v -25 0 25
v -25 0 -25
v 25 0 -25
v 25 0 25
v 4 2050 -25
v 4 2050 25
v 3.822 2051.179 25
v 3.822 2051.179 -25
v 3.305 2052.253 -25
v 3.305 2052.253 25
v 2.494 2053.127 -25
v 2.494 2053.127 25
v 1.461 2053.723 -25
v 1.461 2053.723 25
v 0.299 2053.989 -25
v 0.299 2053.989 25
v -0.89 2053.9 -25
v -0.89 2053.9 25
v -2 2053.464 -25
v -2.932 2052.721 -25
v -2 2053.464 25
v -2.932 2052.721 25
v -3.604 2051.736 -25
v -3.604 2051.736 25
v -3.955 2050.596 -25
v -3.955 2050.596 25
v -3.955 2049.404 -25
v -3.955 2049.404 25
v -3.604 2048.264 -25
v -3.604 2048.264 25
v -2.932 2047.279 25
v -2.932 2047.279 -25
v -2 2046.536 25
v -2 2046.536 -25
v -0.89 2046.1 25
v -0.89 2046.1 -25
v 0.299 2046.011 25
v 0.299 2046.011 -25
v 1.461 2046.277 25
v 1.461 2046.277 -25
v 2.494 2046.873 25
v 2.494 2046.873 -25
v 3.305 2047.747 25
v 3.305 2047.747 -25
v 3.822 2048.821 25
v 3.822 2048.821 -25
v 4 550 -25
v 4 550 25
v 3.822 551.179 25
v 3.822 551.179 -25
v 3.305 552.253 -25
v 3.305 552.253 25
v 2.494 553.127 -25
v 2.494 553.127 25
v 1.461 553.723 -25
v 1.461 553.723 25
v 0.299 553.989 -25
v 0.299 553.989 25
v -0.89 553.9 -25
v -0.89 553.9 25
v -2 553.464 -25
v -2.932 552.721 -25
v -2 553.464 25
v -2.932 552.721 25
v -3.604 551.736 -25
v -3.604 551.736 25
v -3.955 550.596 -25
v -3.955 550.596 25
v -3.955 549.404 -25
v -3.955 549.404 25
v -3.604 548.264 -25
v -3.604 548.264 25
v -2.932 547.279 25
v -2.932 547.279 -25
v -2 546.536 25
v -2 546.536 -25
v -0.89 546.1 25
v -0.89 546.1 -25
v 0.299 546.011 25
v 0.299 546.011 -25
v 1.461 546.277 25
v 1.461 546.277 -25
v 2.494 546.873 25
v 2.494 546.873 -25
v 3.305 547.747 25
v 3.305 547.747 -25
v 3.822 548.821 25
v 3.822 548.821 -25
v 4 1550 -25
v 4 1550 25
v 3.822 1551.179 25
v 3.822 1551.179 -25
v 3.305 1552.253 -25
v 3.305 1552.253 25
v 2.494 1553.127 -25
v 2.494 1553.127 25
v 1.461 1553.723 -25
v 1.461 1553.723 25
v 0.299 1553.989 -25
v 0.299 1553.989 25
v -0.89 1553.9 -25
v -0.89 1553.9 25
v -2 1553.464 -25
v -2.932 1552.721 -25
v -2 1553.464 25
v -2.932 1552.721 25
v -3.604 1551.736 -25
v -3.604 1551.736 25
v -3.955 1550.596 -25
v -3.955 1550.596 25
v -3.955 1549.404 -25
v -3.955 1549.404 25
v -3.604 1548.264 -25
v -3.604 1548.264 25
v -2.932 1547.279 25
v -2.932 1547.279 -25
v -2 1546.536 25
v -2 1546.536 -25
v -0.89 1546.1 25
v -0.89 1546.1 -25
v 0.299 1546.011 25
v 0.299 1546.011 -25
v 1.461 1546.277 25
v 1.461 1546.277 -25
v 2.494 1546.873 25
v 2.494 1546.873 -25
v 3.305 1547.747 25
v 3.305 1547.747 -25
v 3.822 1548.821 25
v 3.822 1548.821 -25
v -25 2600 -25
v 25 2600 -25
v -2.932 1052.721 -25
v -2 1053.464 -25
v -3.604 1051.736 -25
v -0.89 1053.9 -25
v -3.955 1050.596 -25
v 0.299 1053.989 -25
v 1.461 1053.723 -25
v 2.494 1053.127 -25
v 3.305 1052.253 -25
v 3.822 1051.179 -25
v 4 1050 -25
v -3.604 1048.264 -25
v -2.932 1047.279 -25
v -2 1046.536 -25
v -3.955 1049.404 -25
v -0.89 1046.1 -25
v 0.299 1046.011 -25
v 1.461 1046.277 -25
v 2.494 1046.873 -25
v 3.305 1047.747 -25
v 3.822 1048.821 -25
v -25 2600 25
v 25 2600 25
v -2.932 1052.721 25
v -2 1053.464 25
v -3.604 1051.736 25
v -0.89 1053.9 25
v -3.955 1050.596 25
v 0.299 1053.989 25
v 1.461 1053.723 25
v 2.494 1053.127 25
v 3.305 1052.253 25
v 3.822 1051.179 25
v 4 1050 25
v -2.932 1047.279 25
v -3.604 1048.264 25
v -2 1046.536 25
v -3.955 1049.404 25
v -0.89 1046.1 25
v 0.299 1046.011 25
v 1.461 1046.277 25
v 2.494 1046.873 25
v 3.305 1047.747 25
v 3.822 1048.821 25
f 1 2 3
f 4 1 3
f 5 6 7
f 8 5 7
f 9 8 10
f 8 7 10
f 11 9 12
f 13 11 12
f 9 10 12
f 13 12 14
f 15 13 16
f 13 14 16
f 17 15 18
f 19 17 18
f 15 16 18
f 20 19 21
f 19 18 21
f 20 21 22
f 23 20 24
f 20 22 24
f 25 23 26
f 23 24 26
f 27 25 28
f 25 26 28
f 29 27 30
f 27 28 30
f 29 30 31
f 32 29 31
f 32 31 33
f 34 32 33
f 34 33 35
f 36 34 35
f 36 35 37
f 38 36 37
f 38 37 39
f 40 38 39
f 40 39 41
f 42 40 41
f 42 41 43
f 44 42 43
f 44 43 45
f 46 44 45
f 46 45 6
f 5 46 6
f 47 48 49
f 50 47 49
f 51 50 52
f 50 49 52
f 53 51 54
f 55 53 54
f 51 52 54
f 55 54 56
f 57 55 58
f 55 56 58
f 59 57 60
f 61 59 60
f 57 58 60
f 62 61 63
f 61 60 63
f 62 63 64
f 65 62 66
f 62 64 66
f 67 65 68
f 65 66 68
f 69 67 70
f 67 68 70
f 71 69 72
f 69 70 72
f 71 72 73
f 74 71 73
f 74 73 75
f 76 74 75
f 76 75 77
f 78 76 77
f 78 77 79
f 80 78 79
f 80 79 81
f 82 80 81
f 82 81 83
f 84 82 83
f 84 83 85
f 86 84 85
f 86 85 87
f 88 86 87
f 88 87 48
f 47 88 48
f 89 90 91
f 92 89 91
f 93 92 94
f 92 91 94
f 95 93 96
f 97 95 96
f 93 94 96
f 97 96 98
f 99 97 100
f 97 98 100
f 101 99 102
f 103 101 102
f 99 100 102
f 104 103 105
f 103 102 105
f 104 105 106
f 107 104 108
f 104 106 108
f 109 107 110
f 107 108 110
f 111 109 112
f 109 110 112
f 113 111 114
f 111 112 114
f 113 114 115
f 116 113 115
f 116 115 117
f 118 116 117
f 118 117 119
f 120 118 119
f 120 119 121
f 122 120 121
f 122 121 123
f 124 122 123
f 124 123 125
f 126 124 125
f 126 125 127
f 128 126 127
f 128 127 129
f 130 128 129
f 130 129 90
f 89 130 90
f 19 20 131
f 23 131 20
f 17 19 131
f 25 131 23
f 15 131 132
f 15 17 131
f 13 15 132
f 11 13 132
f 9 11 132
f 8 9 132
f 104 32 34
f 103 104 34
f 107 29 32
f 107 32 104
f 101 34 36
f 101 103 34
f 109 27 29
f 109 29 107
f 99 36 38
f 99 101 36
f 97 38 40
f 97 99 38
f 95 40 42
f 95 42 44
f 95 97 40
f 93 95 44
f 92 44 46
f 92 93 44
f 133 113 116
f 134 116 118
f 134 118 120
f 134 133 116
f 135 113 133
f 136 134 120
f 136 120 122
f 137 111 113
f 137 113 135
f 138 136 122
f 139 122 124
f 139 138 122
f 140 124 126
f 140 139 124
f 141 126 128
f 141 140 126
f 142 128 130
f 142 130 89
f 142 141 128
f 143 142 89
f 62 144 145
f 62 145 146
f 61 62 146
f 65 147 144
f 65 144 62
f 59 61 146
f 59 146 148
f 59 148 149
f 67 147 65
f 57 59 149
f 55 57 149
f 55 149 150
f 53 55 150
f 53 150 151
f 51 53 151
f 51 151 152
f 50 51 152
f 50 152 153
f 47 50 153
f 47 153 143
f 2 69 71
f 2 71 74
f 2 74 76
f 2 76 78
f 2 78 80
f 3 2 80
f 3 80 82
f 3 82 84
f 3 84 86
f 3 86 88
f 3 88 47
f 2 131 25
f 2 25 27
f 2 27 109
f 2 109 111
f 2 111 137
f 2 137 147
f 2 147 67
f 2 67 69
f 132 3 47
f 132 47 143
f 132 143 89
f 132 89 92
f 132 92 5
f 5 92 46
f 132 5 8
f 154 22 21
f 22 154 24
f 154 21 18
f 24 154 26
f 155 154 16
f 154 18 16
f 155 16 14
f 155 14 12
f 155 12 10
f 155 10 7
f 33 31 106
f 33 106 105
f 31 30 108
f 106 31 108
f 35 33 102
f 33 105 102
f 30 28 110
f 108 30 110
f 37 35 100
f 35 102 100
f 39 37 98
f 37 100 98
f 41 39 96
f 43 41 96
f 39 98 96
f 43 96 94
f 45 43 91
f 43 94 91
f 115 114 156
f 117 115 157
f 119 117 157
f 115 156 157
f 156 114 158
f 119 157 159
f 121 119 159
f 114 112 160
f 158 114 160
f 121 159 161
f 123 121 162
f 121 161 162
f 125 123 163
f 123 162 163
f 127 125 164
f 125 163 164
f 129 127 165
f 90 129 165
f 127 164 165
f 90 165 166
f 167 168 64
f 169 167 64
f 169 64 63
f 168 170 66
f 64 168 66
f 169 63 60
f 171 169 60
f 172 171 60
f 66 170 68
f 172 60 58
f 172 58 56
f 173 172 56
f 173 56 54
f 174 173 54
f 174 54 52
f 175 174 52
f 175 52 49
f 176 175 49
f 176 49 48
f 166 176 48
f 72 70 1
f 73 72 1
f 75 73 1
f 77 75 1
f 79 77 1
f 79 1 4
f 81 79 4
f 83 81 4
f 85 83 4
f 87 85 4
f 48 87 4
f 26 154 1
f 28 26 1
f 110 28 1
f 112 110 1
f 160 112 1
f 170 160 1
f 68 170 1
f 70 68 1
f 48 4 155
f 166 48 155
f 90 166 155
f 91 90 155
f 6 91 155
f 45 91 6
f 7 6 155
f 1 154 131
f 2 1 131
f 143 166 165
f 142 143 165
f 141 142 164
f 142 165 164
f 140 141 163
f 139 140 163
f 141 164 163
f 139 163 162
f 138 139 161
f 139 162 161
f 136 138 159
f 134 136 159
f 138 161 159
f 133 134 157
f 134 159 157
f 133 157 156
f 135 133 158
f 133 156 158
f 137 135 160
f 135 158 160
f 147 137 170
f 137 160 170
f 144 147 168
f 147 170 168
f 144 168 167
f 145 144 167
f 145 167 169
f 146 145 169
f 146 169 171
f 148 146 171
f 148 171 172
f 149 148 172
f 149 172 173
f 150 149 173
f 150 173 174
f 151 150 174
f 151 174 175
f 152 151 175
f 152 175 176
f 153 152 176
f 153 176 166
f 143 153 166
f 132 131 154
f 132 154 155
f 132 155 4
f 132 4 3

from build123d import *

# Parameters (mm, degrees)
SKETCH_1_W          = 50
SKETCH_1_H          = 50
EXTRUDE_1_DEPTH     = 2600
SKETCH_2_R          = 4
CUT_EXTRUDE_1_DEPTH = 100


with BuildPart() as part:
    # Эскиз1 → Бобышка-Вытянуть1 (new body)
    with BuildSketch(Plane(origin=(0, 0, 0), x_dir=(1, 0, 0), z_dir=(0, 1, 0))):
        Rectangle(SKETCH_1_W, SKETCH_1_H)
    extrude(amount=EXTRUDE_1_DEPTH)

    # Эскиз2 → Вырез-Вытянуть1 (cut)
    with BuildSketch(Plane.XY.offset(25)):
        with Locations((0, 2050)):
            Circle(SKETCH_2_R)
        with Locations((0, 1550)):
            Circle(SKETCH_2_R)
        with Locations((0, 1050)):
            Circle(SKETCH_2_R)
        with Locations((0, 550)):
            Circle(SKETCH_2_R)
    extrude(amount=-CUT_EXTRUDE_1_DEPTH, mode=Mode.SUBTRACT)


solid = part.part
